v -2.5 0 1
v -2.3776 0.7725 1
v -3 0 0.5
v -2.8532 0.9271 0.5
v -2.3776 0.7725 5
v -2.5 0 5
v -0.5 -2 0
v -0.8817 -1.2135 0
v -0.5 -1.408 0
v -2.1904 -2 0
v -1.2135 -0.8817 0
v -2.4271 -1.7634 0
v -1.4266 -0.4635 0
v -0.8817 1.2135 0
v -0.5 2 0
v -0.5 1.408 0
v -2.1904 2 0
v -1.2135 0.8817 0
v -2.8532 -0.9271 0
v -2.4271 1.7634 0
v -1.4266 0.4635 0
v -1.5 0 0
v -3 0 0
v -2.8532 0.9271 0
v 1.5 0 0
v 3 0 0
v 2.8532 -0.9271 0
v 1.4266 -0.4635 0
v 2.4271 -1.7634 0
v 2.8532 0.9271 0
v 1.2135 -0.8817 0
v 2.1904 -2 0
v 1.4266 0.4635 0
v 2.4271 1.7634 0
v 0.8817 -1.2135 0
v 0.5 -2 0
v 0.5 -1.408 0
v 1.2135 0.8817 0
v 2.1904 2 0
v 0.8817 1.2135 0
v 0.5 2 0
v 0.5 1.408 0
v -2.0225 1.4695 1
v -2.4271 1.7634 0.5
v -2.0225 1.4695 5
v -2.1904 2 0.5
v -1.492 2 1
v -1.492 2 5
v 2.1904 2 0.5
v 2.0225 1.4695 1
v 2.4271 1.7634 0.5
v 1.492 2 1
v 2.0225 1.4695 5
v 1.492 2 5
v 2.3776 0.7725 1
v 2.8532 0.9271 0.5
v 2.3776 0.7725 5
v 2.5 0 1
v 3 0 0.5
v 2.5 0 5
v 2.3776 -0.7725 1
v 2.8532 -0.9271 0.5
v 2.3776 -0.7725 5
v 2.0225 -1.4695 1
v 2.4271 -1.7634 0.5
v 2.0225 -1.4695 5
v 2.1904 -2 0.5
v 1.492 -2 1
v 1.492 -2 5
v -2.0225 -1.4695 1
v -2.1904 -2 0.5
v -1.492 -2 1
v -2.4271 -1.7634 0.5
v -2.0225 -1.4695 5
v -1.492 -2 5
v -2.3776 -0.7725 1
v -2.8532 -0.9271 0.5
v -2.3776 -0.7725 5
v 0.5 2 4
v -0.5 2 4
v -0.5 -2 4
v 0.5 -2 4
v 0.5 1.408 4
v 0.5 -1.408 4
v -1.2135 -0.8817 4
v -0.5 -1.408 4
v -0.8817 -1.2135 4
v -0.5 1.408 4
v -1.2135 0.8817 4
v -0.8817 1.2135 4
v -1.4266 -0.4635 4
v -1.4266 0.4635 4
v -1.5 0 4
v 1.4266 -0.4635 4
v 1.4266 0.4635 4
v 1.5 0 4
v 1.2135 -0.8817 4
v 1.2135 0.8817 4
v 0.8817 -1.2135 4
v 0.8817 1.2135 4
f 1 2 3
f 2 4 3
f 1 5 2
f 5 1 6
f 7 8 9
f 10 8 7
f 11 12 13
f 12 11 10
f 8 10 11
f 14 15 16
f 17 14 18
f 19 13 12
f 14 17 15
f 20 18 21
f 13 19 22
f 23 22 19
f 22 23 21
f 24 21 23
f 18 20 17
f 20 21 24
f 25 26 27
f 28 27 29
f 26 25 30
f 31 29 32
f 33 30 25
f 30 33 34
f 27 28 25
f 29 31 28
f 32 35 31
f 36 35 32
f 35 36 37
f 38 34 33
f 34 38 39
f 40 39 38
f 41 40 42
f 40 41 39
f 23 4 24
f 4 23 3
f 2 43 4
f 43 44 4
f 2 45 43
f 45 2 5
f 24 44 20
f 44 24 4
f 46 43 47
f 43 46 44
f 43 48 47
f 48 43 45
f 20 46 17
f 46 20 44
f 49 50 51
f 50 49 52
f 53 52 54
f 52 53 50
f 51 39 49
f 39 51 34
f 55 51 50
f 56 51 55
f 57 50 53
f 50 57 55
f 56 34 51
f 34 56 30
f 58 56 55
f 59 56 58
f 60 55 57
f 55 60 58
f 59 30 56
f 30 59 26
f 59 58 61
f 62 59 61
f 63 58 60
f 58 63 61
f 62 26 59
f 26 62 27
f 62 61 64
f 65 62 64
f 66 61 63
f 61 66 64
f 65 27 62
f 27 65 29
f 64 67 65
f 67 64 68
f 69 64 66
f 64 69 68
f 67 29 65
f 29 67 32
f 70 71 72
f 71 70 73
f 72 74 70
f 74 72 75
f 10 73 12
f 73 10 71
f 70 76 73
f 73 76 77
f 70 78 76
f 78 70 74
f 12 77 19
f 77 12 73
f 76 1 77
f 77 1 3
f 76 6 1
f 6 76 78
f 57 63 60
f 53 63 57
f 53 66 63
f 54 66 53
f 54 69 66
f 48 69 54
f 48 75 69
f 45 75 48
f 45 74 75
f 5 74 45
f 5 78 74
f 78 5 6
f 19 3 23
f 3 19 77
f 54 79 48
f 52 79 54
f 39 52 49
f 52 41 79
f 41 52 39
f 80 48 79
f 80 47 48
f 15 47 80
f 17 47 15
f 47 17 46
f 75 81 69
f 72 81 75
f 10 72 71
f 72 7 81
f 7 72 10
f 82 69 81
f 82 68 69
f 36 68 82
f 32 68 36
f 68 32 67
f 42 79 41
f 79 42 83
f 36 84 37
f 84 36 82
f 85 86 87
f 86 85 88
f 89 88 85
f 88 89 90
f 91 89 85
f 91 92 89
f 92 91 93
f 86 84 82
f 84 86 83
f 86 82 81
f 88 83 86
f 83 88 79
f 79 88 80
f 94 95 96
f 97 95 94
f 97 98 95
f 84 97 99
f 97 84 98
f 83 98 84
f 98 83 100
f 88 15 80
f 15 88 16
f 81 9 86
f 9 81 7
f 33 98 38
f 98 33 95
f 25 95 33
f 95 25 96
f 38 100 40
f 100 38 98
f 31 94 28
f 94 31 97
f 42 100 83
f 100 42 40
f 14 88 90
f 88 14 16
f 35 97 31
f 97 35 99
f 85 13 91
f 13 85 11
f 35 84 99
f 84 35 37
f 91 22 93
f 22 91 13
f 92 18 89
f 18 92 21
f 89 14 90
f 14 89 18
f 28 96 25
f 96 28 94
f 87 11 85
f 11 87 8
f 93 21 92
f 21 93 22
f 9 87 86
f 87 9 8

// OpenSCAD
lipl = 1.0; //lip length
lipd = 6.0;
ebl = 5.0; //overall length of the endbody
linkd = 5.0; //link body diameter
linkh = 4.0; //link body height 
splitw = 1.0;
splitl = 4.0;

endbody_points = [
                    [0,0],
                    [0,ebl],
                    [linkd/2,ebl],
                    [linkd/2,lipl],
                    [lipd/2,lipl/2],
                    [lipd/2,0]
                 ];


difference(){
    rotate_extrude($fn=20)
    polygon(endbody_points);
    
    //top and bottom cutting cubes
    translate([-5,linkh/2,0])cube([10,10,10]);
    translate([-5,-10-linkh/2,0])cube([10,10,10]);
    
    //split cutting cube
    translate([-splitw/2,-5,0])cube([splitw,10,splitl]);
    
    //split cutting cylinder
    cylinder(h=splitl, d=linkd-2,$fn=20);
}
